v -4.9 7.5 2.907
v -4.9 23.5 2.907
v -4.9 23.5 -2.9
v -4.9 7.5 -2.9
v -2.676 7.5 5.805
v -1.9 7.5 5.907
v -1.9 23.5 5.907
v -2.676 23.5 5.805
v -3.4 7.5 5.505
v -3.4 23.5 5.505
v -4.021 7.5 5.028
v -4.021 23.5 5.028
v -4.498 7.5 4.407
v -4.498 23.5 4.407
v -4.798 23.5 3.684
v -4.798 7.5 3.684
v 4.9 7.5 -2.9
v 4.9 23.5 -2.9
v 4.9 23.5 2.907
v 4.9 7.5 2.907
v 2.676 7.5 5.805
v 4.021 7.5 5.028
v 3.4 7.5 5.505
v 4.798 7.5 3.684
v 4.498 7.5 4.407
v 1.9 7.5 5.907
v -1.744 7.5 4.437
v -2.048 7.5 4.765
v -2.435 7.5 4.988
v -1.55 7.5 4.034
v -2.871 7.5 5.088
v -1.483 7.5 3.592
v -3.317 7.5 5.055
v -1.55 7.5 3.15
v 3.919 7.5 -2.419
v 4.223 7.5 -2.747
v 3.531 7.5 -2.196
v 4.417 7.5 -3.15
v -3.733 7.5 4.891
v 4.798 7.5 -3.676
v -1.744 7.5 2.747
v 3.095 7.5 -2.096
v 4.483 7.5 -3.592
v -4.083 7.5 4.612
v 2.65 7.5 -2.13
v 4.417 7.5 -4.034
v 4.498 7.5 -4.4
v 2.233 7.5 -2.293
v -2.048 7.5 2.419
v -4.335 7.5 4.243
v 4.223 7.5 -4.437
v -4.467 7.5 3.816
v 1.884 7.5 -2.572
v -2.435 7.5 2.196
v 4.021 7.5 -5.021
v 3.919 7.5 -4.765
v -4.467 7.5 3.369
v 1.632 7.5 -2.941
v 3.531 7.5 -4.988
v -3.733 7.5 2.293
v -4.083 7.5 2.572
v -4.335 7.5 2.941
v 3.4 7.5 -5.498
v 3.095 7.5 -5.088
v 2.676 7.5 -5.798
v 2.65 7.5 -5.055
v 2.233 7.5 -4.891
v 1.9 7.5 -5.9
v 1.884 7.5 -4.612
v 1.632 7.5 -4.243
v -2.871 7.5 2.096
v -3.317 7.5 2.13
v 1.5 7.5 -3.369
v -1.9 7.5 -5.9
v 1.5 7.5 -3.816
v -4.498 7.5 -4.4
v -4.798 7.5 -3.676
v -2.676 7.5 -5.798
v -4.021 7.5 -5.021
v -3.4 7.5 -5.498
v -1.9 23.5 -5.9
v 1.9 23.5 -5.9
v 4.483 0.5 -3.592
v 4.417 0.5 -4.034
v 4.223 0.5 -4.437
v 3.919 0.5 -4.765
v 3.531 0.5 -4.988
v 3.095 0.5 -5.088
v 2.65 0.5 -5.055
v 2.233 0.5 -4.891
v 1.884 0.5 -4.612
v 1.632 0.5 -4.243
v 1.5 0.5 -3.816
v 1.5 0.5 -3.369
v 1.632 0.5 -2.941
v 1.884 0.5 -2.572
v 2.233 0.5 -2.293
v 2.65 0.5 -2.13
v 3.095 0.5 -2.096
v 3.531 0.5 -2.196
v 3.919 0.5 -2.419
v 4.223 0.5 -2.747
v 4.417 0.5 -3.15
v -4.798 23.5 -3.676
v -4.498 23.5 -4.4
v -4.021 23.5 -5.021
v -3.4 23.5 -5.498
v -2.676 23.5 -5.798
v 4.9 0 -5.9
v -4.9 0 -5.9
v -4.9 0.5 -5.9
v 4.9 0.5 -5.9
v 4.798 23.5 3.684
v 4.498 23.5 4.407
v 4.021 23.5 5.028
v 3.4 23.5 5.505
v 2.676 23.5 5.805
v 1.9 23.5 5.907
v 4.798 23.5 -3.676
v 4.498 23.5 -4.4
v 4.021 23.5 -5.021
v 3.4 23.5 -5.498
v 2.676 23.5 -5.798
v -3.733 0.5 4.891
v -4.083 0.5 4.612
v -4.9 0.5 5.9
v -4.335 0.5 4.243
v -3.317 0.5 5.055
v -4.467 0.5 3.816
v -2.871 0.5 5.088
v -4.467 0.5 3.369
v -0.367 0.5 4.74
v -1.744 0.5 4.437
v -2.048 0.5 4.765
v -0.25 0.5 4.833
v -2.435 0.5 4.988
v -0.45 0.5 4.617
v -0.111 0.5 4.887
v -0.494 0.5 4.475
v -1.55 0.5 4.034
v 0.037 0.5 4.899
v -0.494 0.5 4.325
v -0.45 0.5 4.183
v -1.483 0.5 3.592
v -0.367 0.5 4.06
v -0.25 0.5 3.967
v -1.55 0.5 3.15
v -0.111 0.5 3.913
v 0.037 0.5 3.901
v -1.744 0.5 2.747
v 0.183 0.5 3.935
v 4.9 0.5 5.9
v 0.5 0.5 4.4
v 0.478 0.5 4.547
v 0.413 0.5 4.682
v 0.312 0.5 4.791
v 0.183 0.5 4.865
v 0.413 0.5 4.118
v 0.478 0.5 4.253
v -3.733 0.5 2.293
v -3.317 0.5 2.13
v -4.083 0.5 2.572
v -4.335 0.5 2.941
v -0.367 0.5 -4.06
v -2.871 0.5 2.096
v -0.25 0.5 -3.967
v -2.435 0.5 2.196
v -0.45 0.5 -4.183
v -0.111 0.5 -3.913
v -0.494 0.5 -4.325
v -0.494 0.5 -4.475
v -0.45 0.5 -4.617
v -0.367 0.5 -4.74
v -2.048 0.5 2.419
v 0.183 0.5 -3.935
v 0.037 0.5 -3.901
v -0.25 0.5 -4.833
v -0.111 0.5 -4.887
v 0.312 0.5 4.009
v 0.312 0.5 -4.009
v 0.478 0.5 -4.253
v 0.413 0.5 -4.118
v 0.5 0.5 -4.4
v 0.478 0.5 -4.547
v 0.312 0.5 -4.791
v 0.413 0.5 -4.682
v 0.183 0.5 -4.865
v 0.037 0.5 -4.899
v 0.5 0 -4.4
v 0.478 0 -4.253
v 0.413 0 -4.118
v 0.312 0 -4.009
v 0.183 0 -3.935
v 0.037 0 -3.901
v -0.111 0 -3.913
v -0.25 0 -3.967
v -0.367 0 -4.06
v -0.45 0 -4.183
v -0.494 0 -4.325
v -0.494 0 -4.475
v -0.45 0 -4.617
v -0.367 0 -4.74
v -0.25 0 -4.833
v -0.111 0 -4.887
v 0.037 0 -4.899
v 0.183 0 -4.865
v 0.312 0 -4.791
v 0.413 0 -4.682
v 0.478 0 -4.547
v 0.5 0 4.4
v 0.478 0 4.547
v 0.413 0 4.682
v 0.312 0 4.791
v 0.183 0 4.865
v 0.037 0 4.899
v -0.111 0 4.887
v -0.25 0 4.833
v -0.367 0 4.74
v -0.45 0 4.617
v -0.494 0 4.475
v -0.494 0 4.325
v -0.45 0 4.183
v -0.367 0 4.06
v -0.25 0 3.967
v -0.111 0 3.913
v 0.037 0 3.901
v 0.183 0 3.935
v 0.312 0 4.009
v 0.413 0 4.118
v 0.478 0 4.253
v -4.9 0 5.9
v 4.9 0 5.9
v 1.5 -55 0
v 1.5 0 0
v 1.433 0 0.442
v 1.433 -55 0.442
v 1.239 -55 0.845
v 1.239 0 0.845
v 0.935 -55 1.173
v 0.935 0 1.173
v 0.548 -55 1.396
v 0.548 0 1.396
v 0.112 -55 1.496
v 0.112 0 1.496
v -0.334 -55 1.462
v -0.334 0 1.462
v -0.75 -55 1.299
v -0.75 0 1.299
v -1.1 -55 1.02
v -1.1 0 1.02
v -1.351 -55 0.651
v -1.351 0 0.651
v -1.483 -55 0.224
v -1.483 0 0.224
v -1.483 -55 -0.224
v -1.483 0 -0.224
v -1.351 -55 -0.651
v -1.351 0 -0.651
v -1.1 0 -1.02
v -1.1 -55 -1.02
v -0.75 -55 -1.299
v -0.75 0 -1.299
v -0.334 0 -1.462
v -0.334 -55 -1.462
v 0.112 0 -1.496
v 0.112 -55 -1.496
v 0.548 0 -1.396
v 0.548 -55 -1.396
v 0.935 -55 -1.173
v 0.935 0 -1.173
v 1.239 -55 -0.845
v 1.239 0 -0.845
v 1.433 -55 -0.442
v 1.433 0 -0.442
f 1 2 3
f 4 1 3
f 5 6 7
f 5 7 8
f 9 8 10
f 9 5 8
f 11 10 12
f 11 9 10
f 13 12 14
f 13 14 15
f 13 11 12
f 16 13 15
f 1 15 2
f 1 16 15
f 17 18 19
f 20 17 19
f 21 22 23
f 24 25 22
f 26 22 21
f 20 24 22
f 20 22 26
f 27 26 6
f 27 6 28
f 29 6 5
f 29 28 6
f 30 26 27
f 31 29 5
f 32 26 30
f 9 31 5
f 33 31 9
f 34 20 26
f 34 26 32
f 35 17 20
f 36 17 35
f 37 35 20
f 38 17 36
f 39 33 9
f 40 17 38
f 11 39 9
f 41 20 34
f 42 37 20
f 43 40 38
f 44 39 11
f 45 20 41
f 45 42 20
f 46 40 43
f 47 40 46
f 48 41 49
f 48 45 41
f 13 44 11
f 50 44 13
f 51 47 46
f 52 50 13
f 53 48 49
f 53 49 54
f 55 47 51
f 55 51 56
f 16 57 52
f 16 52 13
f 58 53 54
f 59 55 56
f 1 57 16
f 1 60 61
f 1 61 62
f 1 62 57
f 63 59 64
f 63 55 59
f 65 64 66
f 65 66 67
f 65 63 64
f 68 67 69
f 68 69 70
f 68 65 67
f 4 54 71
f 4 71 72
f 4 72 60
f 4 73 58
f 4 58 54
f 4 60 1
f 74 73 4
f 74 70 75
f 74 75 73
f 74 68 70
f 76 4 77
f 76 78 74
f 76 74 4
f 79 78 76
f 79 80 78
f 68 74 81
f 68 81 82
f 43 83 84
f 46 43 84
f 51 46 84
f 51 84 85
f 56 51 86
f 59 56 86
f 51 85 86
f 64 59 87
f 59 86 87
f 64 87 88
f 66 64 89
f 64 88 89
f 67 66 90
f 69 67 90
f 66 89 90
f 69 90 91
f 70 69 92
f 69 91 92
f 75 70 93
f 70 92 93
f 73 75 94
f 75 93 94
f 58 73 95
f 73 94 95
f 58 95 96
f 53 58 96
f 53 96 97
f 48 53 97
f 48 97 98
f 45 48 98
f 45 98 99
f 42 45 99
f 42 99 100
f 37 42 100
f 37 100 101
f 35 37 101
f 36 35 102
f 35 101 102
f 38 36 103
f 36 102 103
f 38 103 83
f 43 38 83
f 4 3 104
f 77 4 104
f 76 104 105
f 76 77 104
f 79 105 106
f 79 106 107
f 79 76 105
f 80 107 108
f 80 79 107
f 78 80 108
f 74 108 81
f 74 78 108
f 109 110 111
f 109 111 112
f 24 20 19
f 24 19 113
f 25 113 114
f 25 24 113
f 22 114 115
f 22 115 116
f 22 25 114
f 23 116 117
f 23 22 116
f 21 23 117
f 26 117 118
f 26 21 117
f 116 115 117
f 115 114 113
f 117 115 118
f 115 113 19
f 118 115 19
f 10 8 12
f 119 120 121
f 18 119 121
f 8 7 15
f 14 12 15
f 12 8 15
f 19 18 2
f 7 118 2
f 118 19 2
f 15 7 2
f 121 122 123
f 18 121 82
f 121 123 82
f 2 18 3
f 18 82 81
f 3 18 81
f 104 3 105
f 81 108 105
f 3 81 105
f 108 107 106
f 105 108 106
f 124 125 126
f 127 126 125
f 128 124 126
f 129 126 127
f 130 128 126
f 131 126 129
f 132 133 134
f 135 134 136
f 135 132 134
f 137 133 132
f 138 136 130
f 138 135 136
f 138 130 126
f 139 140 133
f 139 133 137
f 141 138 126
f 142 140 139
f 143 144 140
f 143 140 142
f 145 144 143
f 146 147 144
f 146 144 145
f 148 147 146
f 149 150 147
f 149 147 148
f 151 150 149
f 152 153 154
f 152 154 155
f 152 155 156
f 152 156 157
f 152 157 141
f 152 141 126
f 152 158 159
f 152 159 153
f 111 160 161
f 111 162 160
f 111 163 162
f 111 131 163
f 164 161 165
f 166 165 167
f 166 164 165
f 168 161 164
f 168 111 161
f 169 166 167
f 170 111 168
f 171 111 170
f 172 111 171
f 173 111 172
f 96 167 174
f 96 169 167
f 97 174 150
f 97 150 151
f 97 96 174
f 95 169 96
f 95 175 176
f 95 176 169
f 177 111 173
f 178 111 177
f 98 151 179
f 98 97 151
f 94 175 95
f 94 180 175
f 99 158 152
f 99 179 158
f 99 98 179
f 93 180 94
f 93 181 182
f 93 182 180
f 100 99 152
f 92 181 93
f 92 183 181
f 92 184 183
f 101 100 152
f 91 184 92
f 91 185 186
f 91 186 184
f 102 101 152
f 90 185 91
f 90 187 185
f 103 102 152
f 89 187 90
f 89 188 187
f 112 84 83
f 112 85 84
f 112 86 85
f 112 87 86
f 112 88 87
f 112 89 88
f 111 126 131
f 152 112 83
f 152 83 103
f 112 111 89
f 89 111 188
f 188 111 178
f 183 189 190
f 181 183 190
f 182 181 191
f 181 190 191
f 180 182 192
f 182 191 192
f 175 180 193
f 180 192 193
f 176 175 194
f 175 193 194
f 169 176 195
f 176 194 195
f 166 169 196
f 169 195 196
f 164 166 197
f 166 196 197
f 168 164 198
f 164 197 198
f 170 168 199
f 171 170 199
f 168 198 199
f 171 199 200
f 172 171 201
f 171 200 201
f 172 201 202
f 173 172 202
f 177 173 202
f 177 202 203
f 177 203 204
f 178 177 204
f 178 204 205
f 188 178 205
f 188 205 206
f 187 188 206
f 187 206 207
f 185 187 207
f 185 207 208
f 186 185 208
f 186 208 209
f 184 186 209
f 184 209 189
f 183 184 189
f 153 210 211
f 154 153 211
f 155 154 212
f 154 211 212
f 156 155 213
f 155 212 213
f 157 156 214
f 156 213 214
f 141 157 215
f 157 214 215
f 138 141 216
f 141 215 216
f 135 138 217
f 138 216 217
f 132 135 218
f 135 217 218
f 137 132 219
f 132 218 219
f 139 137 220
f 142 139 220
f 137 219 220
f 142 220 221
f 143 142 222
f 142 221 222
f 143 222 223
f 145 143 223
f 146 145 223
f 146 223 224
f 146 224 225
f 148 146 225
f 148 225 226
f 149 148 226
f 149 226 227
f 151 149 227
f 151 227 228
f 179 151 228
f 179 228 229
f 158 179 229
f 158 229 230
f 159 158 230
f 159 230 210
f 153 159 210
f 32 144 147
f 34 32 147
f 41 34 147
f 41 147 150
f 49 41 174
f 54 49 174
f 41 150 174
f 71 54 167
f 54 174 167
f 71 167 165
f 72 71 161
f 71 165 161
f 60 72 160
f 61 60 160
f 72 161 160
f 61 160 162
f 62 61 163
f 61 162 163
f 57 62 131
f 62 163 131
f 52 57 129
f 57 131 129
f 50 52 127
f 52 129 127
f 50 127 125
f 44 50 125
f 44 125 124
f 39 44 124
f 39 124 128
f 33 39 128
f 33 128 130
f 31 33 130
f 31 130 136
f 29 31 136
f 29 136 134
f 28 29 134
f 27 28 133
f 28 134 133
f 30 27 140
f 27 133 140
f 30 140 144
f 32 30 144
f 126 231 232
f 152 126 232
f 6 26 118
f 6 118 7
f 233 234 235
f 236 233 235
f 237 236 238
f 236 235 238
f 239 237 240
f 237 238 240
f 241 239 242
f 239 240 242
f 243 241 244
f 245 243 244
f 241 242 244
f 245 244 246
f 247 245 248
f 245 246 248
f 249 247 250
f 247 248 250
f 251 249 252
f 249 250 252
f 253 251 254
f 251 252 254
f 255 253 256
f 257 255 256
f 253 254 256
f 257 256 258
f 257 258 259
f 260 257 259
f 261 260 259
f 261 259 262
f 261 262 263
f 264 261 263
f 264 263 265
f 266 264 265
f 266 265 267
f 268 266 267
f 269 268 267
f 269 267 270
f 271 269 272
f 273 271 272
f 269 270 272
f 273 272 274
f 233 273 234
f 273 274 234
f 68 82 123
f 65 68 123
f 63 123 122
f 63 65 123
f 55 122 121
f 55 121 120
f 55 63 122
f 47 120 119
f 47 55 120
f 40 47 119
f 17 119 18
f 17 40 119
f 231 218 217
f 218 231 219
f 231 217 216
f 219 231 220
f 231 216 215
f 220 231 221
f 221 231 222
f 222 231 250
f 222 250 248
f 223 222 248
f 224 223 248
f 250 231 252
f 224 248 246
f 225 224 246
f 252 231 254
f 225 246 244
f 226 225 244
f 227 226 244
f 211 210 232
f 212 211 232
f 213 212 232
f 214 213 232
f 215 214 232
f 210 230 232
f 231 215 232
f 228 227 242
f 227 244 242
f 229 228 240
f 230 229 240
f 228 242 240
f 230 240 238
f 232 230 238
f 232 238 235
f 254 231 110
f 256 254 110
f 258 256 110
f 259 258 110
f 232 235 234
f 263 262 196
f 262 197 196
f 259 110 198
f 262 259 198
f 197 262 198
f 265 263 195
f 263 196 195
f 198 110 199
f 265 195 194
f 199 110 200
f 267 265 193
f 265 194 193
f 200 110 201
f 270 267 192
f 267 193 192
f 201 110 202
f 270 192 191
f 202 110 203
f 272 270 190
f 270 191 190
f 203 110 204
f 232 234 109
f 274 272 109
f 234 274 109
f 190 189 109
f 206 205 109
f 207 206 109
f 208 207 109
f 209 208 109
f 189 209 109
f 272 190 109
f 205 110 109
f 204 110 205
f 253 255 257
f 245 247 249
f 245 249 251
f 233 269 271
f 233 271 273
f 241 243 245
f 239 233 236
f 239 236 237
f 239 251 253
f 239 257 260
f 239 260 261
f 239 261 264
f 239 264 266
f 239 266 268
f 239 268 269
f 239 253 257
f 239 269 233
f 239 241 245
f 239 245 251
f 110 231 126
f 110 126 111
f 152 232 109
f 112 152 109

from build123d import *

# Parameters (mm, degrees)
SKETCH1_W           = 9.8
SKETCH1_H           = 11.8
BOSS_EXTRUDE1_DEPTH = 0.5
SKETCH2_R           = 1.5
BOSS_EXTRUDE2_DEPTH = 55
SKETCH5_R           = 0.5
CUT_EXTRUDE1_DEPTH  = 55
SKETCH6_R           = 1.5
BOSS_EXTRUDE3_DEPTH = 7
BOSS_EXTRUDE4_DEPTH = 16


with BuildPart() as part:
    # Sketch1 → Boss-Extrude1 (new body)
    with BuildSketch(Plane(origin=(0, 0, 0), x_dir=(1, 0, 0), z_dir=(0, 1, 0))):
        Rectangle(SKETCH1_W, SKETCH1_H)
    extrude(amount=BOSS_EXTRUDE1_DEPTH)

    # Sketch2 → Boss-Extrude2 (add)
    with BuildSketch(Plane.XZ):
        Circle(SKETCH2_R)
    extrude(amount=BOSS_EXTRUDE2_DEPTH)

    # Sketch5 → Cut-Extrude1 (cut)
    with BuildSketch(Plane.XZ):
        with Locations((0, 4.4)):
            Circle(SKETCH5_R)
        with Locations((0, -4.4)):
            Circle(SKETCH5_R)
    extrude(amount=-CUT_EXTRUDE1_DEPTH, mode=Mode.SUBTRACT)

    # Sketch6 → Boss-Extrude3 (add)
    with BuildSketch(Plane(origin=(0, 0.5, 0), x_dir=(1, 0, 0), z_dir=(0, 1, 0))):
        with Locations((-2.983296991, -3.592133112)):
            Circle(SKETCH6_R)
        with Locations((2.983296991, 3.592133112)):
            Circle(SKETCH6_R)
    extrude(amount=BOSS_EXTRUDE3_DEPTH)

    # Sketch7 → Boss-Extrude4 (add)
    with BuildSketch(Plane(origin=(0, 7.5, 0), x_dir=(1, 0, 0), z_dir=(0, 1, 0))):
        with BuildLine():
            Line((-1.9, 5.9), (1.9, 5.9))
            ThreePointArc((1.9, 5.9), (4.021320344, 5.021320344), (4.9, 2.9))
            Line((4.9, 2.9), (4.9, -2.907128276))
            ThreePointArc((4.9, -2.907128276), (4.021320344, -5.028448619), (1.9, -5.907128276))
            Line((1.9, -5.907128276), (-1.9, -5.907128276))
            ThreePointArc((-1.9, -5.907128276), (-4.021320344, -5.028448619), (-4.9, -2.907128276))
            Line((-4.9, -2.907128276), (-4.9, 2.9))
            ThreePointArc((-4.9, 2.9), (-4.021320344, 5.021320344), (-1.9, 5.9))
        make_face()
    extrude(amount=BOSS_EXTRUDE4_DEPTH)


solid = part.part
